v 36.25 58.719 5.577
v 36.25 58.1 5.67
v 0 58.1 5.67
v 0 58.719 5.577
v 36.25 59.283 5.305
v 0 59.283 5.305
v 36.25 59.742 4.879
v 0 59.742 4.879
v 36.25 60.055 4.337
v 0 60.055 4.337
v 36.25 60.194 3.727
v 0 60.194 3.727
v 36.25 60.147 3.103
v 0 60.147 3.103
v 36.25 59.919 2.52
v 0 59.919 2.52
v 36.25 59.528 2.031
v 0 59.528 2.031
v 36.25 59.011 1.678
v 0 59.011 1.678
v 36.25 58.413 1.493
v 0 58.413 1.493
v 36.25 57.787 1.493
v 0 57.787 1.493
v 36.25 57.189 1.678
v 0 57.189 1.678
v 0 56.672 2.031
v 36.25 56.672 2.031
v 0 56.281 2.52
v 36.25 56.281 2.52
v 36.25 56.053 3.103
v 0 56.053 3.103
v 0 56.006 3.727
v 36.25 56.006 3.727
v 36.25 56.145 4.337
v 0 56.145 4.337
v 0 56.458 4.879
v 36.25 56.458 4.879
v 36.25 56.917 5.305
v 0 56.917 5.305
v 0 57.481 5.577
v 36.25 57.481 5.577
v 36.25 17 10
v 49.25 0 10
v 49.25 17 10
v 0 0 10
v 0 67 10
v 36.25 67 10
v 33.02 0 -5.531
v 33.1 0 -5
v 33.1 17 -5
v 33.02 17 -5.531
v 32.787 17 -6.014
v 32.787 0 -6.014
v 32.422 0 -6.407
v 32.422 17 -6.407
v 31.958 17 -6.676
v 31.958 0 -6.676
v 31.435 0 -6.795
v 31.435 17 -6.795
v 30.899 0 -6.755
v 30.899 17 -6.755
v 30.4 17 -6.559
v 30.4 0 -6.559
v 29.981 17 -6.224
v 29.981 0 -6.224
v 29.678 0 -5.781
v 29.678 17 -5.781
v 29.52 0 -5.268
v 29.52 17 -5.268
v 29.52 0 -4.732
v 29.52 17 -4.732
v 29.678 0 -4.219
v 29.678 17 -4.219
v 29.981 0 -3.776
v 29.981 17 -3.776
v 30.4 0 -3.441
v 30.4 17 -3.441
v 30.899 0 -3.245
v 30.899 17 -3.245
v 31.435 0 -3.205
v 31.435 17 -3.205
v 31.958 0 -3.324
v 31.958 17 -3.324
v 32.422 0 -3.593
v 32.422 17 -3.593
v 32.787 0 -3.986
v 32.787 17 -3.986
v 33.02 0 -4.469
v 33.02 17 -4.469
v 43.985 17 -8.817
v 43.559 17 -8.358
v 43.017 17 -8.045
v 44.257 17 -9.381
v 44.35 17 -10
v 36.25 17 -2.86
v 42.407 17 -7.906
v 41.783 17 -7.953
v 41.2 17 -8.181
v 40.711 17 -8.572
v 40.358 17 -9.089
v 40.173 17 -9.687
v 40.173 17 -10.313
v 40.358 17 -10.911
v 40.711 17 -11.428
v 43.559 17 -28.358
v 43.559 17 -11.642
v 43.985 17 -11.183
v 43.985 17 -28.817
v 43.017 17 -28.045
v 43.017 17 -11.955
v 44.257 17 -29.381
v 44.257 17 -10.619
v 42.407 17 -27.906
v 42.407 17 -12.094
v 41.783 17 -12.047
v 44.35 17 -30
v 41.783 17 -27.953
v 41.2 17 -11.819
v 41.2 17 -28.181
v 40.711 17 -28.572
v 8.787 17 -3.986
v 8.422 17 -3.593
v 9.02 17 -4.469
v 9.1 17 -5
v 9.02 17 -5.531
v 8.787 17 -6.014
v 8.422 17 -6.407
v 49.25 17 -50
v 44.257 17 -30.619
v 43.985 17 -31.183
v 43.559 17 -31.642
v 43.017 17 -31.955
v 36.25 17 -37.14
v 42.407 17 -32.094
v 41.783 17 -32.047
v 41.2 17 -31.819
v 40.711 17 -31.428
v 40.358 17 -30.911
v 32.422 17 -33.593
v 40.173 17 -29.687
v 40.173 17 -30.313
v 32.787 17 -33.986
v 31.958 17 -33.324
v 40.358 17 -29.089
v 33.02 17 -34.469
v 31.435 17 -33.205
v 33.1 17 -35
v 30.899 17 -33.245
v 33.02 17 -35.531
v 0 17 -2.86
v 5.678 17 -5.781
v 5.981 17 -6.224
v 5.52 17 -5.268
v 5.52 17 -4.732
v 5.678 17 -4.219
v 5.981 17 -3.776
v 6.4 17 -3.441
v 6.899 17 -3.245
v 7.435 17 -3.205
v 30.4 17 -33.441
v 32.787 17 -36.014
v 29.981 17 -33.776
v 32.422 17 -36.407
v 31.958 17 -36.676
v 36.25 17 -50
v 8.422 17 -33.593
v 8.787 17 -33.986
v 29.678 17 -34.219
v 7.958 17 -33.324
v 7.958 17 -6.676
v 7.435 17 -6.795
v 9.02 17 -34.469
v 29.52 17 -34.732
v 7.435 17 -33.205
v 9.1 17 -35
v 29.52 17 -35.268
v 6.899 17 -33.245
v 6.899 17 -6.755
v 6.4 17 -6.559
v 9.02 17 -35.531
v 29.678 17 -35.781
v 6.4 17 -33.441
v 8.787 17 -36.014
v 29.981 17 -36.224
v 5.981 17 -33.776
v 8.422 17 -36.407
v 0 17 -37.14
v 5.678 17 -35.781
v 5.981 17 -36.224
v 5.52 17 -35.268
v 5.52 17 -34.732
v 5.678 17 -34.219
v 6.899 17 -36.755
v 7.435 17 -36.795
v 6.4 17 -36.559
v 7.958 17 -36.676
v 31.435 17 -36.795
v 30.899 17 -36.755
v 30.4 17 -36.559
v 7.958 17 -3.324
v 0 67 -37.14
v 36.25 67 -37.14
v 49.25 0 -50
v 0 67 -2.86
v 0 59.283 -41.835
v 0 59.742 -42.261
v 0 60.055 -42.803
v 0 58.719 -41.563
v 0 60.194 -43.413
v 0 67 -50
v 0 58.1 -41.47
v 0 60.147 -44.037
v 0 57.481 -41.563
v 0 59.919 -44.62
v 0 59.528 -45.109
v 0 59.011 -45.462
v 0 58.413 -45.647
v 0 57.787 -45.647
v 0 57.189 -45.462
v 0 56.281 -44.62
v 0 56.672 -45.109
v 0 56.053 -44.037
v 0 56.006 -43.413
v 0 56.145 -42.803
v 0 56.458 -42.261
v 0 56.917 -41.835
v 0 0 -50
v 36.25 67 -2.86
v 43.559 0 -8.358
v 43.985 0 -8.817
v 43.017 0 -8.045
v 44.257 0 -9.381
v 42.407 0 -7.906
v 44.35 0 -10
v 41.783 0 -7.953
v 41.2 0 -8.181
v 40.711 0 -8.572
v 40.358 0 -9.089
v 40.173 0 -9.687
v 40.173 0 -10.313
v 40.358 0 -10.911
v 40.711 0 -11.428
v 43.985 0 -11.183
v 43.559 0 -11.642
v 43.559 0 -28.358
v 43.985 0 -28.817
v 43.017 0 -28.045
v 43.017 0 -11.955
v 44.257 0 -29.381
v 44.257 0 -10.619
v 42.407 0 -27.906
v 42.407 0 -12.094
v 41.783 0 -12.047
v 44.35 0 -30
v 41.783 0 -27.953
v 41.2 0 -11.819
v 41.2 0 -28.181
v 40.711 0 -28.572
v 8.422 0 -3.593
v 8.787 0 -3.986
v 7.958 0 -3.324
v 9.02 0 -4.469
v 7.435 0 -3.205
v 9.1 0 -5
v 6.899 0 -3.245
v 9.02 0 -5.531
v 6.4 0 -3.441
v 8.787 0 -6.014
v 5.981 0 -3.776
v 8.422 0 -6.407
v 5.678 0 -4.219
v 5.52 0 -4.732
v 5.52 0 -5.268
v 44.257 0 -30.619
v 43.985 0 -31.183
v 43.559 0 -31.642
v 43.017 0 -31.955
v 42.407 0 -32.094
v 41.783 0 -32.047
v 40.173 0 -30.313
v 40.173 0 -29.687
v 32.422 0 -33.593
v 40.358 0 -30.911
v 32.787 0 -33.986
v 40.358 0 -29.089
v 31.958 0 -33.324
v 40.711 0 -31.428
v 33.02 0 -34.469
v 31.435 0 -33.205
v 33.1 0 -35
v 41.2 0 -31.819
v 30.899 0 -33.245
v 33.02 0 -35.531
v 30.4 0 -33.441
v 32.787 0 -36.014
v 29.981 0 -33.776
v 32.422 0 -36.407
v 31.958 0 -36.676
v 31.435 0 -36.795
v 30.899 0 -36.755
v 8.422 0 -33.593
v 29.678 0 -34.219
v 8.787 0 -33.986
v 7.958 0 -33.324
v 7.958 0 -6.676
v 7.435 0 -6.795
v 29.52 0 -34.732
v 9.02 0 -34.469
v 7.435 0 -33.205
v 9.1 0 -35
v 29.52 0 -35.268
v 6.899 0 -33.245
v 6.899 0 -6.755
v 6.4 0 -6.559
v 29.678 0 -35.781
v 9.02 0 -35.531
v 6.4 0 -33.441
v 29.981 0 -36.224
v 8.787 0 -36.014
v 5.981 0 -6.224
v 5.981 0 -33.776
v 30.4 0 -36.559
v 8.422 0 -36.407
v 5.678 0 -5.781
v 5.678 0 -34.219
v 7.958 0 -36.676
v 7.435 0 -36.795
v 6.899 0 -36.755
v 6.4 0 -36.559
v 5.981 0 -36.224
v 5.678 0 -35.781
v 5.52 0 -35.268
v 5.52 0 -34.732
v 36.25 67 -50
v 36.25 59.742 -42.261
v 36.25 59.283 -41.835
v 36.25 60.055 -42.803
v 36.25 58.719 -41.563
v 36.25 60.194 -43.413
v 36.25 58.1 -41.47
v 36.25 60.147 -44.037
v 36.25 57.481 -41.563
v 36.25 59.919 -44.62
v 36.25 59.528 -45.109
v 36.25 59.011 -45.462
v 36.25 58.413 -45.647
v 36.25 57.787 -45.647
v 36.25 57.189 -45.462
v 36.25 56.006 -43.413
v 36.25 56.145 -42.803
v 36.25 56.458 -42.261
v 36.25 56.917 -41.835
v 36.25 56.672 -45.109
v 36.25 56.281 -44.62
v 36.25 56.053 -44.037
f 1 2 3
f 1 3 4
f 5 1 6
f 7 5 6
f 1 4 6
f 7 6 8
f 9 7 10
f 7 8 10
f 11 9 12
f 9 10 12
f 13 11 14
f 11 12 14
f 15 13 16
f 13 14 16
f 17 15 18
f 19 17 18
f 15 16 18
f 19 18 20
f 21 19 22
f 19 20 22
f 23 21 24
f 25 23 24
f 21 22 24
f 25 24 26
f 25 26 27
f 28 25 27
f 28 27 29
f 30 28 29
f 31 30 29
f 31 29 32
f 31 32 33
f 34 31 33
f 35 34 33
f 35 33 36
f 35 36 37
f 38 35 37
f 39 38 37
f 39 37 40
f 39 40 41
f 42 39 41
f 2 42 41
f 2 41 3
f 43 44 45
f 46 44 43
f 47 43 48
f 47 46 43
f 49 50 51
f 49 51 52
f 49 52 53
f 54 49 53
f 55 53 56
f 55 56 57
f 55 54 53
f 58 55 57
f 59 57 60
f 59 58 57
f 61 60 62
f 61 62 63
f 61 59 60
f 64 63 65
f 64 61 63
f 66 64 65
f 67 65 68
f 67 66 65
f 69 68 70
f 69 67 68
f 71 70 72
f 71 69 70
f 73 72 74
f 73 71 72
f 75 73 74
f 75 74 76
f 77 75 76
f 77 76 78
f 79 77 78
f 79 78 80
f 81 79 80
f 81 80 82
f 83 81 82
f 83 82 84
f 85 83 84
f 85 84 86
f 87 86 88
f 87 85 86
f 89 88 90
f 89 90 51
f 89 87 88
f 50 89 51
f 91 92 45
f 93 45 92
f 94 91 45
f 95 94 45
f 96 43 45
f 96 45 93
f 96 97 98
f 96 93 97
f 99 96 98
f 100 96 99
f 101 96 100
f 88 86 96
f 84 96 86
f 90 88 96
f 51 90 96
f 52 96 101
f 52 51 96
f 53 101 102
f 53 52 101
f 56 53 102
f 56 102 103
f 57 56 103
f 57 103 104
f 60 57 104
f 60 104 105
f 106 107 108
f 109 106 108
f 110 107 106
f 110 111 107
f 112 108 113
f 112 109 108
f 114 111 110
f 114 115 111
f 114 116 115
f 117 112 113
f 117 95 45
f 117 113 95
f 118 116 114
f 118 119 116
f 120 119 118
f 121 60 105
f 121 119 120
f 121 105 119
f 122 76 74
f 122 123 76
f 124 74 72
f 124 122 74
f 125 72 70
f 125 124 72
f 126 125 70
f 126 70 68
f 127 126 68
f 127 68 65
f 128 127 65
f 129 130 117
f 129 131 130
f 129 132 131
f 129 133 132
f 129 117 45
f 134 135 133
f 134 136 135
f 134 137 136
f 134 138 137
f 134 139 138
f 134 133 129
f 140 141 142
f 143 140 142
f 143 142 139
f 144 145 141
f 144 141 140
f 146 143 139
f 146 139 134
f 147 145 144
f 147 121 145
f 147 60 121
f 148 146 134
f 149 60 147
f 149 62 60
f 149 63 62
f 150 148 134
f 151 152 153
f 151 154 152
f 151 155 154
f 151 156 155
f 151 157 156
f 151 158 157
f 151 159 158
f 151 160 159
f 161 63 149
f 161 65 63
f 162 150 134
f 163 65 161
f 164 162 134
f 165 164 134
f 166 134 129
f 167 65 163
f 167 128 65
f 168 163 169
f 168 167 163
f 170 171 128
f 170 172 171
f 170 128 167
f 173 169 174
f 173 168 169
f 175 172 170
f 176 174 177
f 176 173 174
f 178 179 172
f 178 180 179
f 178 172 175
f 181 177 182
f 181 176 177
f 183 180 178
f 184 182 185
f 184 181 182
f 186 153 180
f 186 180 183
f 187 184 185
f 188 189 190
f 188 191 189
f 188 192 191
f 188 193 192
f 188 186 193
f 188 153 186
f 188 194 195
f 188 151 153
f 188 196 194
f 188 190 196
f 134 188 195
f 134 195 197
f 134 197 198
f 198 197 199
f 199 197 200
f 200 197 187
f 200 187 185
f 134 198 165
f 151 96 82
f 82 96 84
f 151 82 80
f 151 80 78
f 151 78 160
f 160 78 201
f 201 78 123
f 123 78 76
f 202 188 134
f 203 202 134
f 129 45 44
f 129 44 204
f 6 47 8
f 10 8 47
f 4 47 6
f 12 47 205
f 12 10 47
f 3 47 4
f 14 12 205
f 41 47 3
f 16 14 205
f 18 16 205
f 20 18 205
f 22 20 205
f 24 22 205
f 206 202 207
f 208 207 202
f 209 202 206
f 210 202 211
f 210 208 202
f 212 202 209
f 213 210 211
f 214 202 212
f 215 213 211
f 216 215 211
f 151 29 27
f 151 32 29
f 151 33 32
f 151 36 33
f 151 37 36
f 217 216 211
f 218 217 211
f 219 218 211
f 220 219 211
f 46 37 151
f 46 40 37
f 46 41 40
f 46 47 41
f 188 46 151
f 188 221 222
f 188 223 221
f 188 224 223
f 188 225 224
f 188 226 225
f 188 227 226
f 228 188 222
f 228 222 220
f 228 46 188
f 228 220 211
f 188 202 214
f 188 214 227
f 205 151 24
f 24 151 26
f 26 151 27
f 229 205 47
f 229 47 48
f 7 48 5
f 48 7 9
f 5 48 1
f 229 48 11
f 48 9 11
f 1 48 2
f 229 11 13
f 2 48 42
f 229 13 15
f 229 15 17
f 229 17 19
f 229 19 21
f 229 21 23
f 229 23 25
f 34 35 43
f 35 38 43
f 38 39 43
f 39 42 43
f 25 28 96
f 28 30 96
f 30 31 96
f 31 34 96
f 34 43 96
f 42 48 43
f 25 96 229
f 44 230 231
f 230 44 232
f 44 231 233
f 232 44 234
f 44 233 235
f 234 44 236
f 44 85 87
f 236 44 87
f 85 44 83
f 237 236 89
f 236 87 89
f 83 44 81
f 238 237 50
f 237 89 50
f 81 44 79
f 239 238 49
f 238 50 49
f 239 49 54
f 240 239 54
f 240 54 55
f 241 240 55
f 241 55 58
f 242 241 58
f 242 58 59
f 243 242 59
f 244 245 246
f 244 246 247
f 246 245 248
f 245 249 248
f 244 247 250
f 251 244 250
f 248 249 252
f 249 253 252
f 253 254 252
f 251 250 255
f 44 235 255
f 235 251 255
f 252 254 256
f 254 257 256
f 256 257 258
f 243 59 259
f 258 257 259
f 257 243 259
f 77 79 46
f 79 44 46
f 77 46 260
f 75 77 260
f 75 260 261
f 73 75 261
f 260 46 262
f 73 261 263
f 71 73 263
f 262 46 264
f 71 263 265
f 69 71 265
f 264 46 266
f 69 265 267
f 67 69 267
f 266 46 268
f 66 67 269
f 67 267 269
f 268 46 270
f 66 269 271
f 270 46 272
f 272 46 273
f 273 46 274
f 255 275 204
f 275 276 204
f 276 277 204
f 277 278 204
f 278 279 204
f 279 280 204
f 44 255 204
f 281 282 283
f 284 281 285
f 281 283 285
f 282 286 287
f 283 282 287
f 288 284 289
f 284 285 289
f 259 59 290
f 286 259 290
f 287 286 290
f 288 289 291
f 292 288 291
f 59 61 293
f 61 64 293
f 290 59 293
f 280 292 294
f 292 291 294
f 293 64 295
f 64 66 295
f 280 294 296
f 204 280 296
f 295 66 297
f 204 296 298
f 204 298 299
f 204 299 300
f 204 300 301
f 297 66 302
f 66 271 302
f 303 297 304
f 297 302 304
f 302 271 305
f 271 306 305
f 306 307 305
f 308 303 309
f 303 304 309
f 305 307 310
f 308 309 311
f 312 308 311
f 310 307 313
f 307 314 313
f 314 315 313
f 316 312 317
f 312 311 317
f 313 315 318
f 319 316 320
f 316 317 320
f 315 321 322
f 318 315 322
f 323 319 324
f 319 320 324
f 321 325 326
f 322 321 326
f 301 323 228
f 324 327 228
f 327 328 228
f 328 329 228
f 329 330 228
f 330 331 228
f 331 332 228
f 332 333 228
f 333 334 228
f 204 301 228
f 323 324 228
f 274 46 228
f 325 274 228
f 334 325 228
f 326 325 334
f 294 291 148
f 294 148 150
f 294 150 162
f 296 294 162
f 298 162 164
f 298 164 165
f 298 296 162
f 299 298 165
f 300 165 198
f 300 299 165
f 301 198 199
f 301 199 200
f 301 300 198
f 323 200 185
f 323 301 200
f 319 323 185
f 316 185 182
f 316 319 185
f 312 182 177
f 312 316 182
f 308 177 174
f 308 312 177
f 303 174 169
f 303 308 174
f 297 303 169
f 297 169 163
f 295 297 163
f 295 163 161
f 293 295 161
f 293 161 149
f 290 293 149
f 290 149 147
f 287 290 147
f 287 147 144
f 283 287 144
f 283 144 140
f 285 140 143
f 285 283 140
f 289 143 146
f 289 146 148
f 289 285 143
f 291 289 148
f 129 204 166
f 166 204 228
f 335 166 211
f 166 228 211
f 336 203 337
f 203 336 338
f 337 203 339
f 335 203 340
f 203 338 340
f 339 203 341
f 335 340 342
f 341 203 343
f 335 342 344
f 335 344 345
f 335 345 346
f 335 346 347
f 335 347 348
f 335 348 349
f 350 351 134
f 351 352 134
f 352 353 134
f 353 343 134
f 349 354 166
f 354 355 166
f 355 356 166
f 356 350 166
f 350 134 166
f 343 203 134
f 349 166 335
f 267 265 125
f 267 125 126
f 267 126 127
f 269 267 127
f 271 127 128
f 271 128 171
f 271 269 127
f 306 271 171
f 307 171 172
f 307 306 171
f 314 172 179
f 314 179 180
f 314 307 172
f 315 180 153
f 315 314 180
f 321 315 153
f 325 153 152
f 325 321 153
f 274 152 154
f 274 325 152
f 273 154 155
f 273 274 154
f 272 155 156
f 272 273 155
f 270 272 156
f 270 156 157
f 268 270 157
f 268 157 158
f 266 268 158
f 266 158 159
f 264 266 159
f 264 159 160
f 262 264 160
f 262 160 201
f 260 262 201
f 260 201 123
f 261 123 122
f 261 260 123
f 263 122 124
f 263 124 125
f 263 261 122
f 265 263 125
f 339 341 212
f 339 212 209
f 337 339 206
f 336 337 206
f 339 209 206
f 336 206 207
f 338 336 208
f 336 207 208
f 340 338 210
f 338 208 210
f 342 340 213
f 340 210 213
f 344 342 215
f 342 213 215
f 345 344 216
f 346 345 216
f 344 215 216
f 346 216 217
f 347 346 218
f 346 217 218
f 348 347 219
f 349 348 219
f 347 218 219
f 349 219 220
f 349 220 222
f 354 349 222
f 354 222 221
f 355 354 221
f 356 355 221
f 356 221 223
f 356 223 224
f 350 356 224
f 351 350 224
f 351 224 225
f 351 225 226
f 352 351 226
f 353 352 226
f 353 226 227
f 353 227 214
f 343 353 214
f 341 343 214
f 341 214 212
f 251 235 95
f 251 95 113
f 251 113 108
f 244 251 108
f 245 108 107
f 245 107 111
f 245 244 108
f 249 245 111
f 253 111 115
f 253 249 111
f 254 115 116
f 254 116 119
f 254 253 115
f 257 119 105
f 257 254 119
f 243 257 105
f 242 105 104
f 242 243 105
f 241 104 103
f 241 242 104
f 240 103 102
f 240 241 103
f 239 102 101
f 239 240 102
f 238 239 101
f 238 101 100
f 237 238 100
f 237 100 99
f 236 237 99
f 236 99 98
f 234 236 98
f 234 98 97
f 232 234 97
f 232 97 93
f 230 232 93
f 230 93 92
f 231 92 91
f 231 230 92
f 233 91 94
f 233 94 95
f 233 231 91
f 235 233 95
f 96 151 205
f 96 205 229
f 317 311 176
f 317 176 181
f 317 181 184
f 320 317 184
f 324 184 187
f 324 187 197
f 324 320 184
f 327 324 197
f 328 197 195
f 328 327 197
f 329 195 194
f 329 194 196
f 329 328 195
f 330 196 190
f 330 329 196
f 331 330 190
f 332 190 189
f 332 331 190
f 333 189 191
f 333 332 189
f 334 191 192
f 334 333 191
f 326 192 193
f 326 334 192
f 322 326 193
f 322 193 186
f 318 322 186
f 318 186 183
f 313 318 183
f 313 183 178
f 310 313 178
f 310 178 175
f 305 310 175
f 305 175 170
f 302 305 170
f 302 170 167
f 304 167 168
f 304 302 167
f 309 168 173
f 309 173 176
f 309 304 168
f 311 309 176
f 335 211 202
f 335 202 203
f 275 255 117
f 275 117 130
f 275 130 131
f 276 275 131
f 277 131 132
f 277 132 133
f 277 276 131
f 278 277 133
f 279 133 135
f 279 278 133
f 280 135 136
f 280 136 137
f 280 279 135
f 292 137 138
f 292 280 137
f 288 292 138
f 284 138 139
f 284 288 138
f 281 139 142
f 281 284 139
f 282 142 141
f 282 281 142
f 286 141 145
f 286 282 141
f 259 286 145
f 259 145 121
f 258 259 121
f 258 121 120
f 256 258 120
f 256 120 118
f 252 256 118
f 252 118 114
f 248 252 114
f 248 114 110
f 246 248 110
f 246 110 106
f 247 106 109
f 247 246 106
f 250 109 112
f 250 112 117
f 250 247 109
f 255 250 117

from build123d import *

# Parameters (mm, degrees)
CROQUIS1_R              = 1.8
CROQUIS1_R_2            = 2.1
SALIENTE_EXTRUIR4_DEPTH = 17
CROQUIS2_W              = 48.25
CROQUIS2_H              = 10
SALIENTE_EXTRUIR5_DEPTH = 17
CROQUIS3_W              = 36.25
CROQUIS3_H              = 12.86
SALIENTE_EXTRUIR6_DEPTH = 50
CROQUIS4_R              = 2.1
CORTAR_EXTRUIR1_DEPTH   = 50
CROQUIS5_W              = 60
CROQUIS5_H              = 17
SALIENTE_EXTRUIR7_DEPTH = 1


with BuildPart() as part:
    # Croquis1 → Saliente-Extruir4 (new body)
    with BuildSketch(Plane(origin=(0, 0, 0), x_dir=(1, 0, 0), z_dir=(0, 1, 0))):
        Polygon((0, 0), (48.11, 0), (48.25, 0), (48.25, 20), (48.25, 40), (48.11, 40), (0, 40), align=None)
        with Locations((7.3, 5)):
            Circle(CROQUIS1_R, mode=Mode.SUBTRACT)
        with Locations((31.3, 5)):
            Circle(CROQUIS1_R, mode=Mode.SUBTRACT)
        with Locations((31.3, 35)):
            Circle(CROQUIS1_R, mode=Mode.SUBTRACT)
        with Locations((7.3, 35)):
            Circle(CROQUIS1_R, mode=Mode.SUBTRACT)
        with Locations((42.25, 30)):
            Circle(CROQUIS1_R_2, mode=Mode.SUBTRACT)
        with Locations((42.25, 10)):
            Circle(CROQUIS1_R_2, mode=Mode.SUBTRACT)
    extrude(amount=SALIENTE_EXTRUIR4_DEPTH)

    # Croquis2 → Saliente-Extruir5 (add)
    with BuildSketch(Plane(origin=(0, 17, 0), x_dir=(1, 0, 0), z_dir=(0, 1, 0))):
        with Locations((24.125, 45)):
            Rectangle(CROQUIS2_W, CROQUIS2_H)
        with Locations((24.125, -5)):
            Rectangle(CROQUIS2_W, CROQUIS2_H)
    extrude(amount=-SALIENTE_EXTRUIR5_DEPTH)

    # Croquis3 → Saliente-Extruir6 (add)
    with BuildSketch(Plane(origin=(0, 17, 0), x_dir=(1, 0, 0), z_dir=(0, 1, 0))):
        with Locations((18.125, 43.57)):
            Rectangle(CROQUIS3_W, CROQUIS3_H)
        with Locations((18.125, -3.57)):
            Rectangle(CROQUIS3_W, CROQUIS3_H)
    extrude(amount=SALIENTE_EXTRUIR6_DEPTH)

    # Croquis4 → Cortar-Extruir1 (cut)
    with BuildSketch(Plane.ZY):
        with Locations((-43.57, 58.1)):
            Circle(CROQUIS4_R)
        with Locations((3.57, 58.1)):
            Circle(CROQUIS4_R)
    extrude(amount=-CORTAR_EXTRUIR1_DEPTH, mode=Mode.SUBTRACT)

    # Croquis5 → Saliente-Extruir7 (add)
    with BuildSketch(Plane(origin=(48.25, 0, 0), x_dir=(0, 0, -1), z_dir=(1, 0, 0))):
        with Locations((20, 8.5)):
            Rectangle(CROQUIS5_W, CROQUIS5_H)
    extrude(amount=SALIENTE_EXTRUIR7_DEPTH)


solid = part.part
